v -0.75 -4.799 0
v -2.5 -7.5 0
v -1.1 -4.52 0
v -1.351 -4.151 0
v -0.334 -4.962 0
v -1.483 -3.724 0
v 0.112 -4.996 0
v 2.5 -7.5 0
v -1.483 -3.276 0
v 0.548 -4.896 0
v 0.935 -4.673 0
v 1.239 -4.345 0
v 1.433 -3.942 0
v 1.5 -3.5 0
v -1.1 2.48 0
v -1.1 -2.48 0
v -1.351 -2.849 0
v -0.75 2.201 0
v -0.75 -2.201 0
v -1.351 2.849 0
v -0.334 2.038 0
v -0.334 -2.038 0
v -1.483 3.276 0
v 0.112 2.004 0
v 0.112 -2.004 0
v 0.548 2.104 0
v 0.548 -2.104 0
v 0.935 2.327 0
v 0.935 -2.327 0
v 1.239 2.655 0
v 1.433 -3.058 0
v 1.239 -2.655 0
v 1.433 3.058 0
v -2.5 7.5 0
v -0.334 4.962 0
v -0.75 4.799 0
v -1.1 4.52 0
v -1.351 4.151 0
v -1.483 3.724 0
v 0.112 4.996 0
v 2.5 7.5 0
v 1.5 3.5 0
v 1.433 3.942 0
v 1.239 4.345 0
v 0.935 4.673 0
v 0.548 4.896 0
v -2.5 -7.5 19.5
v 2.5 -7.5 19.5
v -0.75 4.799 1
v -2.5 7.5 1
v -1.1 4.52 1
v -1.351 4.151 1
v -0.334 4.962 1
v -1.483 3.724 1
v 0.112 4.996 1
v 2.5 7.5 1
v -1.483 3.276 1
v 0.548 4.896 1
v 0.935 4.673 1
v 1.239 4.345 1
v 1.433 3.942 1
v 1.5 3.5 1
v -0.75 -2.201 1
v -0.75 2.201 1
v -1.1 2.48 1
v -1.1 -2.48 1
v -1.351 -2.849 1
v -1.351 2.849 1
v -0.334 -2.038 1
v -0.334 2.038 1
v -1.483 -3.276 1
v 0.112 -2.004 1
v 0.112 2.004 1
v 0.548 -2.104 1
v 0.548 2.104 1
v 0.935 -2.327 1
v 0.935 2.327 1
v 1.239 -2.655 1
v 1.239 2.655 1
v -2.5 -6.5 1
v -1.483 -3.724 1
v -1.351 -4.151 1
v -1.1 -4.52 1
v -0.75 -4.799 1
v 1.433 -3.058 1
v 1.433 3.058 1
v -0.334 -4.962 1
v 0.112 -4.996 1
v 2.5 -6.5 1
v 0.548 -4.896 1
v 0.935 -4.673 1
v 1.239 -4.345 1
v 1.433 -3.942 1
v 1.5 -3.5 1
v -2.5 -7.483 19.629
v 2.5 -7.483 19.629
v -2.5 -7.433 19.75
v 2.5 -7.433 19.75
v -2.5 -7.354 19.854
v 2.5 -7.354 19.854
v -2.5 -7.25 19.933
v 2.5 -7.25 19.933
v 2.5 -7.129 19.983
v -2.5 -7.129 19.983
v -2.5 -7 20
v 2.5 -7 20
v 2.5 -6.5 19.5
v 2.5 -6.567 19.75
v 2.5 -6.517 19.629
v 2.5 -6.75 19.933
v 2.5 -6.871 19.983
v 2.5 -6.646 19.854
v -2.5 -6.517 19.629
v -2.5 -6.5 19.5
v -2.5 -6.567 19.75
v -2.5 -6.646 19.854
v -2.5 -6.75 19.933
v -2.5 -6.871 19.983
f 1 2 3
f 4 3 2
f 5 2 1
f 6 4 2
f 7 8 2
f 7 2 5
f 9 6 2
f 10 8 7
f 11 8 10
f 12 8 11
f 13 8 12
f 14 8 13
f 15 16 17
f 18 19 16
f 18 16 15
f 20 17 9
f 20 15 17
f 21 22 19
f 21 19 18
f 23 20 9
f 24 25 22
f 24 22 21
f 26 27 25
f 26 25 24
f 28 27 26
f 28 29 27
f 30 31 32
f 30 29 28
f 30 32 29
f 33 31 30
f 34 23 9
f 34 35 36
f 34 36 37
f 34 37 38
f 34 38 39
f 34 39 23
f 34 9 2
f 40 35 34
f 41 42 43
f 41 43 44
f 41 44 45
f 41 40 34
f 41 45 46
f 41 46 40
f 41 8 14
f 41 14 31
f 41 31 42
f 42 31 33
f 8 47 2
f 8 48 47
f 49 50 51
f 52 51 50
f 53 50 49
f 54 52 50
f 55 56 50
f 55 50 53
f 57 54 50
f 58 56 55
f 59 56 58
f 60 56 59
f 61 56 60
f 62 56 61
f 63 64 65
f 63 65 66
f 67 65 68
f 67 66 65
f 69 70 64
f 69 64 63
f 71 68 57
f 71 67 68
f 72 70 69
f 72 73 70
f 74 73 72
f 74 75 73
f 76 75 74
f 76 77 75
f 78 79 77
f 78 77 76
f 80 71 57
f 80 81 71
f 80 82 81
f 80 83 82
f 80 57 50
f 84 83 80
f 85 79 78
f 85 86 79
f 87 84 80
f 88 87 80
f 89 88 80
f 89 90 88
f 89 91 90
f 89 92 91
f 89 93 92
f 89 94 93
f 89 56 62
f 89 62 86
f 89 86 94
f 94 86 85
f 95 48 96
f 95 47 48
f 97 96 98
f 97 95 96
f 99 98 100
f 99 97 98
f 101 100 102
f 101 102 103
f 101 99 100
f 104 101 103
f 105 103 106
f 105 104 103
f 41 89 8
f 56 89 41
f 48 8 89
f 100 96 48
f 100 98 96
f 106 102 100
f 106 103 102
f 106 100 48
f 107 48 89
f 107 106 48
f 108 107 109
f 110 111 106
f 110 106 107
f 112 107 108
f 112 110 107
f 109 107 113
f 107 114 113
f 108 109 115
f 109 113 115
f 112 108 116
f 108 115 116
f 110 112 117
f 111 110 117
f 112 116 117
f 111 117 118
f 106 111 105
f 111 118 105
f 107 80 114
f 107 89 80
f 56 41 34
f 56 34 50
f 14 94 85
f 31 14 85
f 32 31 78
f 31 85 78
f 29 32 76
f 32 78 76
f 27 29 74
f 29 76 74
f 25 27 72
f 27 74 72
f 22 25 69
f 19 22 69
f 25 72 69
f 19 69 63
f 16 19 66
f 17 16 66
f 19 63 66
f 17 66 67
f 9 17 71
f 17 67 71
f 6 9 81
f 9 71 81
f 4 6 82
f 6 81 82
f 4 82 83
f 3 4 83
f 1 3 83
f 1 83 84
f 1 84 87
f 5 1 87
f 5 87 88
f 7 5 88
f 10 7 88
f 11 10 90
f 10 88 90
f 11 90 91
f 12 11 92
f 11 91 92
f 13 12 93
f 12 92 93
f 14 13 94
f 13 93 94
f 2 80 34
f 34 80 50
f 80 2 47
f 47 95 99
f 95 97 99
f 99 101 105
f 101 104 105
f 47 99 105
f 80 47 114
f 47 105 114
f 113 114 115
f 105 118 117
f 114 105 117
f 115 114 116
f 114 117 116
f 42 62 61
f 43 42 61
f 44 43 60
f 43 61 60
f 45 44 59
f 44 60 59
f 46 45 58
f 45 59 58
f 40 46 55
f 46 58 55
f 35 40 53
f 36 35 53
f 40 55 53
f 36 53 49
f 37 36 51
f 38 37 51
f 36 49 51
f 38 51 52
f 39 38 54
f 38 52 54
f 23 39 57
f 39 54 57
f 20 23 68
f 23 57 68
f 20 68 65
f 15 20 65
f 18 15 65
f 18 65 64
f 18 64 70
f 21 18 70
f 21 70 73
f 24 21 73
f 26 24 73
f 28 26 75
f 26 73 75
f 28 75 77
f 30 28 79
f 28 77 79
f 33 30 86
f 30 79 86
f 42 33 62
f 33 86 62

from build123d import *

# Parameters (mm, degrees)
F1_DEPTH = 2.5
F2_R     = 1.5
F3_DEPTH = 1
F4_R     = 0.49999


# Not quite as in the source:
# - a fillet or chamfer is up to 0.001 mm smaller than in the source, because OpenCascade refuses the exact size


with BuildPart() as f1:
    # F0 (on Right) → F1 (new body, symmetric)
    with BuildSketch(Plane.YZ):
        Polygon((-7.5, 0), (7.5, 0), (7.5, 1), (-6.5, 1), (-6.5, 20), (-7.5, 20), align=None)
    extrude(amount=F1_DEPTH, both=True)

    # F2 (on face) → F3 (cut, through all)
    with BuildSketch(Plane.XY.offset(1)):
        with Locations((0, 3.5)):
            Circle(F2_R)
        with Locations((0, -3.5)):
            Circle(F2_R)
    extrude(amount=-F3_DEPTH, mode=Mode.SUBTRACT)

    # F4 (radius 0.5 in the source; OpenCascade refuses exactly that, so slightly less here)
    f4_edges = [f1.edges().sort_by_distance(p)[0] for p in [
        (0, -6.5, 20),
        (0, -7.5, 20),
    ]]
    fillet(f4_edges, radius=F4_R)


solid = f1.part
